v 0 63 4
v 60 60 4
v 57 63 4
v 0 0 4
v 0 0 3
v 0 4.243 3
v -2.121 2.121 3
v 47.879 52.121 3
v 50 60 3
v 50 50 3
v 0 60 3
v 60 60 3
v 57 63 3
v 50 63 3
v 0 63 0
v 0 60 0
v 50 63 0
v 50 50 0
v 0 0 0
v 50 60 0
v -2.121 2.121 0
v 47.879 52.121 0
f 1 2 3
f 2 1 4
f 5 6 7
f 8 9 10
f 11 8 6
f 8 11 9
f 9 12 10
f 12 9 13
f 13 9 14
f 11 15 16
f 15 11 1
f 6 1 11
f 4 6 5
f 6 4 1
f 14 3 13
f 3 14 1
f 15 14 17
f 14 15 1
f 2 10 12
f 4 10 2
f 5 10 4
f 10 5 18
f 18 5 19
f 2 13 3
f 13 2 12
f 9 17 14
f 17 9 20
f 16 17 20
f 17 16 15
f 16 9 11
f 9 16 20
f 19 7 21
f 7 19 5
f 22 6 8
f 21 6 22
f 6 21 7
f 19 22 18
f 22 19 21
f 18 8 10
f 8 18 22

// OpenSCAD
translate([0, 60, 0])
	cube([50, 3, 3]);

rotate([0, 0, 45])
	cube([sqrt(2) * 50, 3, 3]);

intersection() {
	translate([0, 0, 3])
		cube([60, 63, 1]);
	rotate([0, 0, 45])
		cube([sqrt(2) * 60, sqrt(2) * 60, 5]);
}
